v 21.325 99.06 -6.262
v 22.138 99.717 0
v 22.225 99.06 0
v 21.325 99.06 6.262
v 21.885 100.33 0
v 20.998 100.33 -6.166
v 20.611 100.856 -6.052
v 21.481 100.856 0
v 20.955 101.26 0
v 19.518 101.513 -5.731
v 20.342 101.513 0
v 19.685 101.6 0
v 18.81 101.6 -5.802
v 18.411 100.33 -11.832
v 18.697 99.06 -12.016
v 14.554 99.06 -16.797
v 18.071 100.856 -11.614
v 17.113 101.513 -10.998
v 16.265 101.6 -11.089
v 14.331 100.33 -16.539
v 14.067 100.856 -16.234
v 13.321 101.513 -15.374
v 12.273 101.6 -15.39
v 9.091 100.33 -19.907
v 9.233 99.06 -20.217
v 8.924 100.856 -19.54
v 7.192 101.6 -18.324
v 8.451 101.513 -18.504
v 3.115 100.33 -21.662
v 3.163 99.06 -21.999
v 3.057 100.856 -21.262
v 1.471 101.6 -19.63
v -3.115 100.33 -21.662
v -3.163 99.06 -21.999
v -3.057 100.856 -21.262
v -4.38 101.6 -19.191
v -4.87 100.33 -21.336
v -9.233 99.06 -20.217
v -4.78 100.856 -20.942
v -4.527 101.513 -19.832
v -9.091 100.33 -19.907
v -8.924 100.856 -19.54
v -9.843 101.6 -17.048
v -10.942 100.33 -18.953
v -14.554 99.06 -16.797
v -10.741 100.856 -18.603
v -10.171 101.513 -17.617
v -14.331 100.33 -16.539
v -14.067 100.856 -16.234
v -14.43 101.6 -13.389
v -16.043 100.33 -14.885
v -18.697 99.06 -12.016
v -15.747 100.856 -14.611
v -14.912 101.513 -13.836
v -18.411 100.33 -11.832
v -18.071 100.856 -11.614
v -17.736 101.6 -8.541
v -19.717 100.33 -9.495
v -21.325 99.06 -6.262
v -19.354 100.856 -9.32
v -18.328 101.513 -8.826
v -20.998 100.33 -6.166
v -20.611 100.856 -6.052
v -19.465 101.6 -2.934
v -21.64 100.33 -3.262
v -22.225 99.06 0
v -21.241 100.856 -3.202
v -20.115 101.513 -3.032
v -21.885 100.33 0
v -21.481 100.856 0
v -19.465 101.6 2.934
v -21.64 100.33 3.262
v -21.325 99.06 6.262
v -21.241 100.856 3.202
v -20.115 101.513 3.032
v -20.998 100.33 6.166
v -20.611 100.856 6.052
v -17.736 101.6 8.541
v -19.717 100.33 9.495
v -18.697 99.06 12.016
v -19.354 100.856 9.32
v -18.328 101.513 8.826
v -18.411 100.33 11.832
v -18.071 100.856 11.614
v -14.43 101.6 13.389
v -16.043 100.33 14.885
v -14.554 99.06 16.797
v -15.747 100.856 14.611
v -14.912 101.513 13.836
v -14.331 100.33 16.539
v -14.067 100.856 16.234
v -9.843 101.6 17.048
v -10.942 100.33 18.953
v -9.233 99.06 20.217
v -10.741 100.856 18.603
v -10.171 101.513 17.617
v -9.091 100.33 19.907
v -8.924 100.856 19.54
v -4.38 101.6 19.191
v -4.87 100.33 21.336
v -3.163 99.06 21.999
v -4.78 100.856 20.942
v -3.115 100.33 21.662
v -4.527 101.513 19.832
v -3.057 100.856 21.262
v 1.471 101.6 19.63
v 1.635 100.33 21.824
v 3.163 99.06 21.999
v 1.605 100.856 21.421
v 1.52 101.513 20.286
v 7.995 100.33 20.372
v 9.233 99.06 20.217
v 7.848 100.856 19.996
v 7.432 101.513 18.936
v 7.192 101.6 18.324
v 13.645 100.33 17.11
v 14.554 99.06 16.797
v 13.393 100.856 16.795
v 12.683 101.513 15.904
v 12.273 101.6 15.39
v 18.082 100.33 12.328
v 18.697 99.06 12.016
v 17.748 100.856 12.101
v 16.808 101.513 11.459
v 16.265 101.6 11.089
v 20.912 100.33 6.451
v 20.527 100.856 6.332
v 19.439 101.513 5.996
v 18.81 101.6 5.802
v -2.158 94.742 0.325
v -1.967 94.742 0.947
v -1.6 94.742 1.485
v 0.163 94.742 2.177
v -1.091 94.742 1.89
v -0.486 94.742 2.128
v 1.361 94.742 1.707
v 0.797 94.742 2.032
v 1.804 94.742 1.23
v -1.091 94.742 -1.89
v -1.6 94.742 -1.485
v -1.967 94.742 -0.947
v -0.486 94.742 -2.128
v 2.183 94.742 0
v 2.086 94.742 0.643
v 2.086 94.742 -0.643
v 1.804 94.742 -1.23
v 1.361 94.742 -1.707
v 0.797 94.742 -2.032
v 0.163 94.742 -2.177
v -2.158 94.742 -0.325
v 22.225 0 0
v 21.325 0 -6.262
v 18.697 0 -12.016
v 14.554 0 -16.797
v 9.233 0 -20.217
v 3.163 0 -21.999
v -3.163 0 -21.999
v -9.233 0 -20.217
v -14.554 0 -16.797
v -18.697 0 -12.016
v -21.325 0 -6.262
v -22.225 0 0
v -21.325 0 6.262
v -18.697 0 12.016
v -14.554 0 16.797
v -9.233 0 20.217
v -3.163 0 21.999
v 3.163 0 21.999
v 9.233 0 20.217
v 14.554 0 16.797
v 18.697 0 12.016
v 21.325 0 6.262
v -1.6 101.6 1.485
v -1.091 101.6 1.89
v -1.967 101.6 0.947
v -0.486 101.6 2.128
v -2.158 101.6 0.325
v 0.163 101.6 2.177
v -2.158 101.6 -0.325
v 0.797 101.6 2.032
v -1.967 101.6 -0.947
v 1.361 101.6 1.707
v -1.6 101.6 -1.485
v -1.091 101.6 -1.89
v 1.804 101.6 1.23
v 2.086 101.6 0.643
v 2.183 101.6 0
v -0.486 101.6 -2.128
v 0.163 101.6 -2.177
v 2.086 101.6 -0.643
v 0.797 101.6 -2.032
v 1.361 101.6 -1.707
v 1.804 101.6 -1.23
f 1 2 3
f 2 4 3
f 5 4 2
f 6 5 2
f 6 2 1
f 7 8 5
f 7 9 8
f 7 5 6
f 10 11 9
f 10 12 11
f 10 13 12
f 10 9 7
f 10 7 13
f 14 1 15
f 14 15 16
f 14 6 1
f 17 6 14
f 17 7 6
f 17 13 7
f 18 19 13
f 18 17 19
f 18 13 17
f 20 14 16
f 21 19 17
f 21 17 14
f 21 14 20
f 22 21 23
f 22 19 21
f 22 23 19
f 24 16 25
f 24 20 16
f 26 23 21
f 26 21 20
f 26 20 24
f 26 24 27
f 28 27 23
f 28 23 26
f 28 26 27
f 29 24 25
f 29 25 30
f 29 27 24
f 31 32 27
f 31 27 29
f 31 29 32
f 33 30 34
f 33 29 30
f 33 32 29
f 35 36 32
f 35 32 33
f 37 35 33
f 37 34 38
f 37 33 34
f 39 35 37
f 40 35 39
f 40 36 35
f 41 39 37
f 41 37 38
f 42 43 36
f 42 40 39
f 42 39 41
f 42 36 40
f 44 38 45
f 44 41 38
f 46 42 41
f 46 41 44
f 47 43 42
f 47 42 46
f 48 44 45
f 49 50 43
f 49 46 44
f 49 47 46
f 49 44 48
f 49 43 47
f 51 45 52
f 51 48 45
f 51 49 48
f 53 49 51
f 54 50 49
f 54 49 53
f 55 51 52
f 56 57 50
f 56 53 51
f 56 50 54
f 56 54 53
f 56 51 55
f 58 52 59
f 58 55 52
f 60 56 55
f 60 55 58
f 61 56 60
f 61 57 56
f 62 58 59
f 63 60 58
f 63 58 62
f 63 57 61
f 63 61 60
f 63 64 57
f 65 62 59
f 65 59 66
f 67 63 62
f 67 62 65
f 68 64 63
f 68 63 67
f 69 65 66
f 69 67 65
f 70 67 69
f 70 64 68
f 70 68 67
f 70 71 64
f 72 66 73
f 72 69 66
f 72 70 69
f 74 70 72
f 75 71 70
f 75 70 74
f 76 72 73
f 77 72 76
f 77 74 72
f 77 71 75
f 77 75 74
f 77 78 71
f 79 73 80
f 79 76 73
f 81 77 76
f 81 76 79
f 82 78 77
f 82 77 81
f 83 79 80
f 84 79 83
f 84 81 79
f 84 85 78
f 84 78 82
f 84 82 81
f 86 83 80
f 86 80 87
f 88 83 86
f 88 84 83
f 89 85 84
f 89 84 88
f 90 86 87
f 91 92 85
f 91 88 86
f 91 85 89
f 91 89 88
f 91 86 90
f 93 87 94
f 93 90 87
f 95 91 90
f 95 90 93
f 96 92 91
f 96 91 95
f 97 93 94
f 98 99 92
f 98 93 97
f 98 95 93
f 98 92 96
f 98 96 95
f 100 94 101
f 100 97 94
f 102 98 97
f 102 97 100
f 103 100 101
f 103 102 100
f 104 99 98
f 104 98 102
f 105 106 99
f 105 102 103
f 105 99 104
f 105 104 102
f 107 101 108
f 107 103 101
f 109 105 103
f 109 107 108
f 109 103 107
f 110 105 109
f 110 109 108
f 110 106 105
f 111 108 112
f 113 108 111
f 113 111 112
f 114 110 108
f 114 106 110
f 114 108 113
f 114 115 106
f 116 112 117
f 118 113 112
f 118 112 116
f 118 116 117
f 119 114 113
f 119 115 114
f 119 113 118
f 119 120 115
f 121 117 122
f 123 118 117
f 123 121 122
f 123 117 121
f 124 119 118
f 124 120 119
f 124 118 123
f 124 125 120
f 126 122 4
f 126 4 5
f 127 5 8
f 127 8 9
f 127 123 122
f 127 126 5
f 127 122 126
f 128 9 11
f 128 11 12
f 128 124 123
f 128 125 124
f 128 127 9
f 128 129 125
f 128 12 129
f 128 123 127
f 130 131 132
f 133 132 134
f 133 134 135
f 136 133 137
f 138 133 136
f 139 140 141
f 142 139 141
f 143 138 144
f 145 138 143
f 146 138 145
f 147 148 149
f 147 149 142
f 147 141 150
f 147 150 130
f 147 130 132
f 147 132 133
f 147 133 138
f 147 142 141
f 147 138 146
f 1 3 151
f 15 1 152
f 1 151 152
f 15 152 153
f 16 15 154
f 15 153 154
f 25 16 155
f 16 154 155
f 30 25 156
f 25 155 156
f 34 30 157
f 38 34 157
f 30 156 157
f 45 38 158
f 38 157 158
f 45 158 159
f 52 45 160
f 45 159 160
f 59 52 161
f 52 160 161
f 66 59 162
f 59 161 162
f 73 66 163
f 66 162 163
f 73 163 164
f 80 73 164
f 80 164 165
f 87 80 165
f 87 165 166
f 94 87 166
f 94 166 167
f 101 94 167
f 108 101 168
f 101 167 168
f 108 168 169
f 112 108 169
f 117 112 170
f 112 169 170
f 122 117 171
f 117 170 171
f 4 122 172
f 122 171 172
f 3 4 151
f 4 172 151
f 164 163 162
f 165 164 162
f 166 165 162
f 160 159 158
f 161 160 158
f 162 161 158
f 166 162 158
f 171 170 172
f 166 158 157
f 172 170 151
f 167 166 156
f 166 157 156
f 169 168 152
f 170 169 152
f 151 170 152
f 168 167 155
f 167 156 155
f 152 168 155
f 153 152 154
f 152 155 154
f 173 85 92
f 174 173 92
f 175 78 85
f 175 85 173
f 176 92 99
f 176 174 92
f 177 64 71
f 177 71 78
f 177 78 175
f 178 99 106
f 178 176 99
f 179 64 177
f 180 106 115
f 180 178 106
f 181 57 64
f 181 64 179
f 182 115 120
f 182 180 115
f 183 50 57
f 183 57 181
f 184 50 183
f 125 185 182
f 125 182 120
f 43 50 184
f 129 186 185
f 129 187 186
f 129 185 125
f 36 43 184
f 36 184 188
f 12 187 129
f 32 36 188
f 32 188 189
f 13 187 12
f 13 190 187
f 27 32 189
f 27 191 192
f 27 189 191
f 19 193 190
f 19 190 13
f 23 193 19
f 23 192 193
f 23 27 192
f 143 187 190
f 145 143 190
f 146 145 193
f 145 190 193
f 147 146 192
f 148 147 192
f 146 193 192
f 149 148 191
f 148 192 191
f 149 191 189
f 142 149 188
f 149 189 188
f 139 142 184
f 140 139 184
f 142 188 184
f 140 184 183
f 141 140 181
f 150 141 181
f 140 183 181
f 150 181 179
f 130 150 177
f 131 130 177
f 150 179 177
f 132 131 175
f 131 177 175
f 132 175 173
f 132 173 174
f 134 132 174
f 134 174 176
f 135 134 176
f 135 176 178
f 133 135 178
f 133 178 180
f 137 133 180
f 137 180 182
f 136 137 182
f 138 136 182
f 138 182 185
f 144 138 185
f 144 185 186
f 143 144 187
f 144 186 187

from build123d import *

# Parameters (mm, degrees)
SKETCH1_R           = 22.225
BOSS_EXTRUDE1_DEPTH = 101.6
FILLET1_R           = 2.54
SKETCH2_R           = 2.1828125
CUT_EXTRUDE1_DEPTH  = 6.858


with BuildPart() as part:
    # Sketch1 → Boss-Extrude1 (new body)
    with BuildSketch(Plane(origin=(0, 0, 0), x_dir=(1, 0, 0), z_dir=(0, 1, 0))):
        Circle(SKETCH1_R)
    extrude(amount=BOSS_EXTRUDE1_DEPTH)

    # Fillet1
    fillet1_edges = [part.edges().sort_by_distance(p)[0] for p in [
        (-22.225, 101.6, 0),
    ]]
    fillet(fillet1_edges, radius=FILLET1_R)

    # Sketch2 → Cut-Extrude1 (cut)
    with BuildSketch(Plane(origin=(0, 101.6, 0), x_dir=(1, 0, 0), z_dir=(0, 1, 0))):
        Circle(SKETCH2_R)
    extrude(amount=-CUT_EXTRUDE1_DEPTH, mode=Mode.SUBTRACT)


solid = part.part
